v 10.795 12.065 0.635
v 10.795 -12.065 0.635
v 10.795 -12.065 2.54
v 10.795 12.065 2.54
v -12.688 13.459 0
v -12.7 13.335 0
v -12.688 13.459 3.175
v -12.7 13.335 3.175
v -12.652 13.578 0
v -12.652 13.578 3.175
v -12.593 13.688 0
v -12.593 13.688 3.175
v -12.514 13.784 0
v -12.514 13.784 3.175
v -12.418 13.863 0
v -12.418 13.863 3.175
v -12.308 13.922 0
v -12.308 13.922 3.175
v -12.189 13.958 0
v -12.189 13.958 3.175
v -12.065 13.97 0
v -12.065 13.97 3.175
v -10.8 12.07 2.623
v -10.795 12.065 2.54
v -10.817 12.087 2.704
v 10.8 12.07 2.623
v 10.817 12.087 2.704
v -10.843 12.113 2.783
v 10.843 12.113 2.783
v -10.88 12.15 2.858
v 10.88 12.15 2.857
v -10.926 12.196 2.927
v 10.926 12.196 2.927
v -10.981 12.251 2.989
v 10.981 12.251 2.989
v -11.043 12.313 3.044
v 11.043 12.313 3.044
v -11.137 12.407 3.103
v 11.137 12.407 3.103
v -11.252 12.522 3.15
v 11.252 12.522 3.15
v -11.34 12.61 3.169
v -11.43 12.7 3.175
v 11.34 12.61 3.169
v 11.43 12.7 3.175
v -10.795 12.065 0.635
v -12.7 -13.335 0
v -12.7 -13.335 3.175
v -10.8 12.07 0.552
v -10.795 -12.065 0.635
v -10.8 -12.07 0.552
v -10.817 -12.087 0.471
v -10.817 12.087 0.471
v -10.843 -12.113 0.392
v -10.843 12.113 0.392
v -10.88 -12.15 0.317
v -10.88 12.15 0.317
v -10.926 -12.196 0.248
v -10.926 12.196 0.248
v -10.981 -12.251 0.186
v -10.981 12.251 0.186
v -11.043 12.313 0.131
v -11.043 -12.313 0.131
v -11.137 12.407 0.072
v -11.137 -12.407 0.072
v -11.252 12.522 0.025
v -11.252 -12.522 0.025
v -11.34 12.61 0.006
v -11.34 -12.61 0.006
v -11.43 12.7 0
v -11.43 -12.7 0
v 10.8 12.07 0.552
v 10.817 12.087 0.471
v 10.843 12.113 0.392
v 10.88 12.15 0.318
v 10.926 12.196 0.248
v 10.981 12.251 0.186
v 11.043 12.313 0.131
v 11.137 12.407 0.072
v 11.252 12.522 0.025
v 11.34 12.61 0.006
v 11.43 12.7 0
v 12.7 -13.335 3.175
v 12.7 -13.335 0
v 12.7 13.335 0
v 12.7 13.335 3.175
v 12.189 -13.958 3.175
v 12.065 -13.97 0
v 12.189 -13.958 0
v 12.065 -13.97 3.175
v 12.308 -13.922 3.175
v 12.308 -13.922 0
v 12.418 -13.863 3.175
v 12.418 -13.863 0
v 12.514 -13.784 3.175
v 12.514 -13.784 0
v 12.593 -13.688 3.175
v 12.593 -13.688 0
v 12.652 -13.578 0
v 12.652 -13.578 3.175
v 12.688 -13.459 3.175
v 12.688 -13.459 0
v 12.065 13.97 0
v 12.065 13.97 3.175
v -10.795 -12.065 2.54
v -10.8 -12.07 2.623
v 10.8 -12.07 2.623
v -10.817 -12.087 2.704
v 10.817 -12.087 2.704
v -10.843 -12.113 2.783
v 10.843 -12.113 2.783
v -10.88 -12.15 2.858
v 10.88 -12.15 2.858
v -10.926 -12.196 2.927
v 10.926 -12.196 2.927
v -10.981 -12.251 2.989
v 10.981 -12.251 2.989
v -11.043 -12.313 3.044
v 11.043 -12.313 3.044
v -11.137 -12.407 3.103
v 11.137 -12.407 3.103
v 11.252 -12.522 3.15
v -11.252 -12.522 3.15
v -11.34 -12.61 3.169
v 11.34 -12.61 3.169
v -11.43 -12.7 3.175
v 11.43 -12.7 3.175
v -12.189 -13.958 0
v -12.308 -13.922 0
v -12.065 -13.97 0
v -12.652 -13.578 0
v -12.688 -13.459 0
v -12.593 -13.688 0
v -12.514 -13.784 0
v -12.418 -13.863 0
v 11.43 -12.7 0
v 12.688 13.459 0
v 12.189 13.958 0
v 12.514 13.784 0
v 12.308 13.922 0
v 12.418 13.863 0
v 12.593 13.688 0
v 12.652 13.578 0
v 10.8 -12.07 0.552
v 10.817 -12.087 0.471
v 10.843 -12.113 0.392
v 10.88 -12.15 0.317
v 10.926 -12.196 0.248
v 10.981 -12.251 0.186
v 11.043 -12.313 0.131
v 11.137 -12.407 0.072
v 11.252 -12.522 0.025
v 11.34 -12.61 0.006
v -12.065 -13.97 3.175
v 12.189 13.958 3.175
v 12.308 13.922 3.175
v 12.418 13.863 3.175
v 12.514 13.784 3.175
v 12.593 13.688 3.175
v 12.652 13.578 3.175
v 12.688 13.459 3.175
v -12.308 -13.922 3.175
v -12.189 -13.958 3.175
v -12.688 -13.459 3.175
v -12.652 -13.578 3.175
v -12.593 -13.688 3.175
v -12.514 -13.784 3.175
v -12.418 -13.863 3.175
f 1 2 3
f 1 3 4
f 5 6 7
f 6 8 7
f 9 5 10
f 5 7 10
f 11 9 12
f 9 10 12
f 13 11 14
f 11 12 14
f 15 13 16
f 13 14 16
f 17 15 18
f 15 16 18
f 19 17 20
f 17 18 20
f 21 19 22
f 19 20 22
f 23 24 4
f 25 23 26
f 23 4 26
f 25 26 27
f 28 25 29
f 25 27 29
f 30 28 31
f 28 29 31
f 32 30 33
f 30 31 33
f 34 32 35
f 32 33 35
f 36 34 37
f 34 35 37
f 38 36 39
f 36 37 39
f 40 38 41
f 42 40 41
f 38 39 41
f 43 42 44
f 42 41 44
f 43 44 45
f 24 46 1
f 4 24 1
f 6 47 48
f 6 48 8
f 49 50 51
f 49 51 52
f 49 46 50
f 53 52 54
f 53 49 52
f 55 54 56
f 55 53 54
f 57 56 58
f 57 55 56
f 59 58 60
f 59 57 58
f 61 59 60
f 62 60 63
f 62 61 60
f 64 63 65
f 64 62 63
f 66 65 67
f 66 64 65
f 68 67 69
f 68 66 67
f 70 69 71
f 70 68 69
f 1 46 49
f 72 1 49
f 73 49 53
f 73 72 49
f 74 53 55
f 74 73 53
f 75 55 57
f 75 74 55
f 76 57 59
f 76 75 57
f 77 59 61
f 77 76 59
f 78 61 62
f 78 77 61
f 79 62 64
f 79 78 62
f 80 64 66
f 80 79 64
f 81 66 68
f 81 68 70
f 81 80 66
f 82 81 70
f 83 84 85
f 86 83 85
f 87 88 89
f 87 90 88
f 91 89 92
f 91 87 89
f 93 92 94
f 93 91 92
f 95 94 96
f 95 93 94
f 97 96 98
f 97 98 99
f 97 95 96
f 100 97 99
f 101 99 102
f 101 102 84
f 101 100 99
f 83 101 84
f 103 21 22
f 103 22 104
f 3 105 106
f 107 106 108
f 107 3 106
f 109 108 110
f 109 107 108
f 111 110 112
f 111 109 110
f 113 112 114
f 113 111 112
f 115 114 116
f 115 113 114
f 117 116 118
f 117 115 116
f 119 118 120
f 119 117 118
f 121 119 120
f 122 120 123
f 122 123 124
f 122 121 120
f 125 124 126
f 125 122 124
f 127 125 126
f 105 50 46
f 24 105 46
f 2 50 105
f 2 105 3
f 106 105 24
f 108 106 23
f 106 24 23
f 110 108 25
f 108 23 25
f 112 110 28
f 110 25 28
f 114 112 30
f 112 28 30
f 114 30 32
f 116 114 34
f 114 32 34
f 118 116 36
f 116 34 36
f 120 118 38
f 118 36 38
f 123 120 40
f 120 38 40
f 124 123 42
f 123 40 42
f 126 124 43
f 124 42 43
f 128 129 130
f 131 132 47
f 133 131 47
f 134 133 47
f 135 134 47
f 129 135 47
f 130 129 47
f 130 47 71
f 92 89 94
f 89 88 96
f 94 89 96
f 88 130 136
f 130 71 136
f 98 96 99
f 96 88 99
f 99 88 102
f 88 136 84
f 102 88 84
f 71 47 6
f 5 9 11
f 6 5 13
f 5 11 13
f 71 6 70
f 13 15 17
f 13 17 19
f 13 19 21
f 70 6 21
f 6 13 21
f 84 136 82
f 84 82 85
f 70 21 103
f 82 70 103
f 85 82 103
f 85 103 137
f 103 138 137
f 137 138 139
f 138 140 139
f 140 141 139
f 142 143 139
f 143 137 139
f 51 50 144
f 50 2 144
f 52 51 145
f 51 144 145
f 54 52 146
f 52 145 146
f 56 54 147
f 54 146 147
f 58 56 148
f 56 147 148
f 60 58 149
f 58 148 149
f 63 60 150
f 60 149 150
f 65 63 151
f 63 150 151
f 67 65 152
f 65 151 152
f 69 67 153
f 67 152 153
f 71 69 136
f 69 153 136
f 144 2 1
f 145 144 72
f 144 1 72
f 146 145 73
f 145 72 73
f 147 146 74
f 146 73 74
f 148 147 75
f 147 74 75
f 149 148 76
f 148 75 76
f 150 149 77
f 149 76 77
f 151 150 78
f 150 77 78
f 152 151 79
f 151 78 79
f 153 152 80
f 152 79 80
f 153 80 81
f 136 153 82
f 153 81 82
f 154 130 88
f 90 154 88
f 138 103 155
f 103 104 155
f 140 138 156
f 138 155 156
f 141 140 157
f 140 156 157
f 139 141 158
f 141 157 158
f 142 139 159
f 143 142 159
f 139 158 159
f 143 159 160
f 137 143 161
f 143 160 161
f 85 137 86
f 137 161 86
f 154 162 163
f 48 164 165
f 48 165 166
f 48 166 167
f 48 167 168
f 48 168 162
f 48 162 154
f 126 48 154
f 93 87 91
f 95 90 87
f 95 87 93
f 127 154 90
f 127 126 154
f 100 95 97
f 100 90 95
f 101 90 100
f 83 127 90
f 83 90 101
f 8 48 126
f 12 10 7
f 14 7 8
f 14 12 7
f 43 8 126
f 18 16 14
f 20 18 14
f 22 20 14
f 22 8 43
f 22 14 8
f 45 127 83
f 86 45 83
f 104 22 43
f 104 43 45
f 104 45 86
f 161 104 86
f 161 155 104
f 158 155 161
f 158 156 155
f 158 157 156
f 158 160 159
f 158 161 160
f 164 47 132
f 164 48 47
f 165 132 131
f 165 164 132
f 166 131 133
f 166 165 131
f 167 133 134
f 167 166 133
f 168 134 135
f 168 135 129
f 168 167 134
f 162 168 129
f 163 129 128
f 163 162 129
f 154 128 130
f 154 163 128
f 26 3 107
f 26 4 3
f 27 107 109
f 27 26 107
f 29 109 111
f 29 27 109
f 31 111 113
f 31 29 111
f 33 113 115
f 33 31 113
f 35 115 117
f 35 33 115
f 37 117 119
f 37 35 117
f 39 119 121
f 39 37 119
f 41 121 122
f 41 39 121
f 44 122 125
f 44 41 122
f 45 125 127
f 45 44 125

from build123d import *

# Parameters (mm, degrees)
SKETCH1_W           = 25.4
SKETCH1_H           = 27.94
SKETCH1_W_2         = 21.59
SKETCH1_H_2         = 24.13
BOSS_EXTRUDE1_DEPTH = 3.175
FILLET1_R           = 0.635


with BuildPart() as part:
    # Sketch1 → Boss-Extrude1 (new body)
    with BuildSketch(Plane.XY):
        Rectangle(SKETCH1_W, SKETCH1_H)
        Rectangle(SKETCH1_W_2, SKETCH1_H_2, mode=Mode.SUBTRACT)
    extrude(amount=BOSS_EXTRUDE1_DEPTH)

    # Fillet1
    fillet1_edges = [part.edges().sort_by_distance(p)[0] for p in [
        (10.795, 0, 0),
        (0, 12.065, 0),
        (-10.795, 0, 0),
        (0, -12.065, 0),
        (10.795, 0, 3.175),
        (0, 12.065, 3.175),
        (-10.795, 0, 3.175),
        (0, -12.065, 3.175),
        (12.7, -13.97, 1.5875),
        (-12.7, -13.97, 1.5875),
        (-12.7, 13.97, 1.5875),
        (12.7, 13.97, 1.5875),
    ]]
    fillet(fillet1_edges, radius=FILLET1_R)


solid = part.part
